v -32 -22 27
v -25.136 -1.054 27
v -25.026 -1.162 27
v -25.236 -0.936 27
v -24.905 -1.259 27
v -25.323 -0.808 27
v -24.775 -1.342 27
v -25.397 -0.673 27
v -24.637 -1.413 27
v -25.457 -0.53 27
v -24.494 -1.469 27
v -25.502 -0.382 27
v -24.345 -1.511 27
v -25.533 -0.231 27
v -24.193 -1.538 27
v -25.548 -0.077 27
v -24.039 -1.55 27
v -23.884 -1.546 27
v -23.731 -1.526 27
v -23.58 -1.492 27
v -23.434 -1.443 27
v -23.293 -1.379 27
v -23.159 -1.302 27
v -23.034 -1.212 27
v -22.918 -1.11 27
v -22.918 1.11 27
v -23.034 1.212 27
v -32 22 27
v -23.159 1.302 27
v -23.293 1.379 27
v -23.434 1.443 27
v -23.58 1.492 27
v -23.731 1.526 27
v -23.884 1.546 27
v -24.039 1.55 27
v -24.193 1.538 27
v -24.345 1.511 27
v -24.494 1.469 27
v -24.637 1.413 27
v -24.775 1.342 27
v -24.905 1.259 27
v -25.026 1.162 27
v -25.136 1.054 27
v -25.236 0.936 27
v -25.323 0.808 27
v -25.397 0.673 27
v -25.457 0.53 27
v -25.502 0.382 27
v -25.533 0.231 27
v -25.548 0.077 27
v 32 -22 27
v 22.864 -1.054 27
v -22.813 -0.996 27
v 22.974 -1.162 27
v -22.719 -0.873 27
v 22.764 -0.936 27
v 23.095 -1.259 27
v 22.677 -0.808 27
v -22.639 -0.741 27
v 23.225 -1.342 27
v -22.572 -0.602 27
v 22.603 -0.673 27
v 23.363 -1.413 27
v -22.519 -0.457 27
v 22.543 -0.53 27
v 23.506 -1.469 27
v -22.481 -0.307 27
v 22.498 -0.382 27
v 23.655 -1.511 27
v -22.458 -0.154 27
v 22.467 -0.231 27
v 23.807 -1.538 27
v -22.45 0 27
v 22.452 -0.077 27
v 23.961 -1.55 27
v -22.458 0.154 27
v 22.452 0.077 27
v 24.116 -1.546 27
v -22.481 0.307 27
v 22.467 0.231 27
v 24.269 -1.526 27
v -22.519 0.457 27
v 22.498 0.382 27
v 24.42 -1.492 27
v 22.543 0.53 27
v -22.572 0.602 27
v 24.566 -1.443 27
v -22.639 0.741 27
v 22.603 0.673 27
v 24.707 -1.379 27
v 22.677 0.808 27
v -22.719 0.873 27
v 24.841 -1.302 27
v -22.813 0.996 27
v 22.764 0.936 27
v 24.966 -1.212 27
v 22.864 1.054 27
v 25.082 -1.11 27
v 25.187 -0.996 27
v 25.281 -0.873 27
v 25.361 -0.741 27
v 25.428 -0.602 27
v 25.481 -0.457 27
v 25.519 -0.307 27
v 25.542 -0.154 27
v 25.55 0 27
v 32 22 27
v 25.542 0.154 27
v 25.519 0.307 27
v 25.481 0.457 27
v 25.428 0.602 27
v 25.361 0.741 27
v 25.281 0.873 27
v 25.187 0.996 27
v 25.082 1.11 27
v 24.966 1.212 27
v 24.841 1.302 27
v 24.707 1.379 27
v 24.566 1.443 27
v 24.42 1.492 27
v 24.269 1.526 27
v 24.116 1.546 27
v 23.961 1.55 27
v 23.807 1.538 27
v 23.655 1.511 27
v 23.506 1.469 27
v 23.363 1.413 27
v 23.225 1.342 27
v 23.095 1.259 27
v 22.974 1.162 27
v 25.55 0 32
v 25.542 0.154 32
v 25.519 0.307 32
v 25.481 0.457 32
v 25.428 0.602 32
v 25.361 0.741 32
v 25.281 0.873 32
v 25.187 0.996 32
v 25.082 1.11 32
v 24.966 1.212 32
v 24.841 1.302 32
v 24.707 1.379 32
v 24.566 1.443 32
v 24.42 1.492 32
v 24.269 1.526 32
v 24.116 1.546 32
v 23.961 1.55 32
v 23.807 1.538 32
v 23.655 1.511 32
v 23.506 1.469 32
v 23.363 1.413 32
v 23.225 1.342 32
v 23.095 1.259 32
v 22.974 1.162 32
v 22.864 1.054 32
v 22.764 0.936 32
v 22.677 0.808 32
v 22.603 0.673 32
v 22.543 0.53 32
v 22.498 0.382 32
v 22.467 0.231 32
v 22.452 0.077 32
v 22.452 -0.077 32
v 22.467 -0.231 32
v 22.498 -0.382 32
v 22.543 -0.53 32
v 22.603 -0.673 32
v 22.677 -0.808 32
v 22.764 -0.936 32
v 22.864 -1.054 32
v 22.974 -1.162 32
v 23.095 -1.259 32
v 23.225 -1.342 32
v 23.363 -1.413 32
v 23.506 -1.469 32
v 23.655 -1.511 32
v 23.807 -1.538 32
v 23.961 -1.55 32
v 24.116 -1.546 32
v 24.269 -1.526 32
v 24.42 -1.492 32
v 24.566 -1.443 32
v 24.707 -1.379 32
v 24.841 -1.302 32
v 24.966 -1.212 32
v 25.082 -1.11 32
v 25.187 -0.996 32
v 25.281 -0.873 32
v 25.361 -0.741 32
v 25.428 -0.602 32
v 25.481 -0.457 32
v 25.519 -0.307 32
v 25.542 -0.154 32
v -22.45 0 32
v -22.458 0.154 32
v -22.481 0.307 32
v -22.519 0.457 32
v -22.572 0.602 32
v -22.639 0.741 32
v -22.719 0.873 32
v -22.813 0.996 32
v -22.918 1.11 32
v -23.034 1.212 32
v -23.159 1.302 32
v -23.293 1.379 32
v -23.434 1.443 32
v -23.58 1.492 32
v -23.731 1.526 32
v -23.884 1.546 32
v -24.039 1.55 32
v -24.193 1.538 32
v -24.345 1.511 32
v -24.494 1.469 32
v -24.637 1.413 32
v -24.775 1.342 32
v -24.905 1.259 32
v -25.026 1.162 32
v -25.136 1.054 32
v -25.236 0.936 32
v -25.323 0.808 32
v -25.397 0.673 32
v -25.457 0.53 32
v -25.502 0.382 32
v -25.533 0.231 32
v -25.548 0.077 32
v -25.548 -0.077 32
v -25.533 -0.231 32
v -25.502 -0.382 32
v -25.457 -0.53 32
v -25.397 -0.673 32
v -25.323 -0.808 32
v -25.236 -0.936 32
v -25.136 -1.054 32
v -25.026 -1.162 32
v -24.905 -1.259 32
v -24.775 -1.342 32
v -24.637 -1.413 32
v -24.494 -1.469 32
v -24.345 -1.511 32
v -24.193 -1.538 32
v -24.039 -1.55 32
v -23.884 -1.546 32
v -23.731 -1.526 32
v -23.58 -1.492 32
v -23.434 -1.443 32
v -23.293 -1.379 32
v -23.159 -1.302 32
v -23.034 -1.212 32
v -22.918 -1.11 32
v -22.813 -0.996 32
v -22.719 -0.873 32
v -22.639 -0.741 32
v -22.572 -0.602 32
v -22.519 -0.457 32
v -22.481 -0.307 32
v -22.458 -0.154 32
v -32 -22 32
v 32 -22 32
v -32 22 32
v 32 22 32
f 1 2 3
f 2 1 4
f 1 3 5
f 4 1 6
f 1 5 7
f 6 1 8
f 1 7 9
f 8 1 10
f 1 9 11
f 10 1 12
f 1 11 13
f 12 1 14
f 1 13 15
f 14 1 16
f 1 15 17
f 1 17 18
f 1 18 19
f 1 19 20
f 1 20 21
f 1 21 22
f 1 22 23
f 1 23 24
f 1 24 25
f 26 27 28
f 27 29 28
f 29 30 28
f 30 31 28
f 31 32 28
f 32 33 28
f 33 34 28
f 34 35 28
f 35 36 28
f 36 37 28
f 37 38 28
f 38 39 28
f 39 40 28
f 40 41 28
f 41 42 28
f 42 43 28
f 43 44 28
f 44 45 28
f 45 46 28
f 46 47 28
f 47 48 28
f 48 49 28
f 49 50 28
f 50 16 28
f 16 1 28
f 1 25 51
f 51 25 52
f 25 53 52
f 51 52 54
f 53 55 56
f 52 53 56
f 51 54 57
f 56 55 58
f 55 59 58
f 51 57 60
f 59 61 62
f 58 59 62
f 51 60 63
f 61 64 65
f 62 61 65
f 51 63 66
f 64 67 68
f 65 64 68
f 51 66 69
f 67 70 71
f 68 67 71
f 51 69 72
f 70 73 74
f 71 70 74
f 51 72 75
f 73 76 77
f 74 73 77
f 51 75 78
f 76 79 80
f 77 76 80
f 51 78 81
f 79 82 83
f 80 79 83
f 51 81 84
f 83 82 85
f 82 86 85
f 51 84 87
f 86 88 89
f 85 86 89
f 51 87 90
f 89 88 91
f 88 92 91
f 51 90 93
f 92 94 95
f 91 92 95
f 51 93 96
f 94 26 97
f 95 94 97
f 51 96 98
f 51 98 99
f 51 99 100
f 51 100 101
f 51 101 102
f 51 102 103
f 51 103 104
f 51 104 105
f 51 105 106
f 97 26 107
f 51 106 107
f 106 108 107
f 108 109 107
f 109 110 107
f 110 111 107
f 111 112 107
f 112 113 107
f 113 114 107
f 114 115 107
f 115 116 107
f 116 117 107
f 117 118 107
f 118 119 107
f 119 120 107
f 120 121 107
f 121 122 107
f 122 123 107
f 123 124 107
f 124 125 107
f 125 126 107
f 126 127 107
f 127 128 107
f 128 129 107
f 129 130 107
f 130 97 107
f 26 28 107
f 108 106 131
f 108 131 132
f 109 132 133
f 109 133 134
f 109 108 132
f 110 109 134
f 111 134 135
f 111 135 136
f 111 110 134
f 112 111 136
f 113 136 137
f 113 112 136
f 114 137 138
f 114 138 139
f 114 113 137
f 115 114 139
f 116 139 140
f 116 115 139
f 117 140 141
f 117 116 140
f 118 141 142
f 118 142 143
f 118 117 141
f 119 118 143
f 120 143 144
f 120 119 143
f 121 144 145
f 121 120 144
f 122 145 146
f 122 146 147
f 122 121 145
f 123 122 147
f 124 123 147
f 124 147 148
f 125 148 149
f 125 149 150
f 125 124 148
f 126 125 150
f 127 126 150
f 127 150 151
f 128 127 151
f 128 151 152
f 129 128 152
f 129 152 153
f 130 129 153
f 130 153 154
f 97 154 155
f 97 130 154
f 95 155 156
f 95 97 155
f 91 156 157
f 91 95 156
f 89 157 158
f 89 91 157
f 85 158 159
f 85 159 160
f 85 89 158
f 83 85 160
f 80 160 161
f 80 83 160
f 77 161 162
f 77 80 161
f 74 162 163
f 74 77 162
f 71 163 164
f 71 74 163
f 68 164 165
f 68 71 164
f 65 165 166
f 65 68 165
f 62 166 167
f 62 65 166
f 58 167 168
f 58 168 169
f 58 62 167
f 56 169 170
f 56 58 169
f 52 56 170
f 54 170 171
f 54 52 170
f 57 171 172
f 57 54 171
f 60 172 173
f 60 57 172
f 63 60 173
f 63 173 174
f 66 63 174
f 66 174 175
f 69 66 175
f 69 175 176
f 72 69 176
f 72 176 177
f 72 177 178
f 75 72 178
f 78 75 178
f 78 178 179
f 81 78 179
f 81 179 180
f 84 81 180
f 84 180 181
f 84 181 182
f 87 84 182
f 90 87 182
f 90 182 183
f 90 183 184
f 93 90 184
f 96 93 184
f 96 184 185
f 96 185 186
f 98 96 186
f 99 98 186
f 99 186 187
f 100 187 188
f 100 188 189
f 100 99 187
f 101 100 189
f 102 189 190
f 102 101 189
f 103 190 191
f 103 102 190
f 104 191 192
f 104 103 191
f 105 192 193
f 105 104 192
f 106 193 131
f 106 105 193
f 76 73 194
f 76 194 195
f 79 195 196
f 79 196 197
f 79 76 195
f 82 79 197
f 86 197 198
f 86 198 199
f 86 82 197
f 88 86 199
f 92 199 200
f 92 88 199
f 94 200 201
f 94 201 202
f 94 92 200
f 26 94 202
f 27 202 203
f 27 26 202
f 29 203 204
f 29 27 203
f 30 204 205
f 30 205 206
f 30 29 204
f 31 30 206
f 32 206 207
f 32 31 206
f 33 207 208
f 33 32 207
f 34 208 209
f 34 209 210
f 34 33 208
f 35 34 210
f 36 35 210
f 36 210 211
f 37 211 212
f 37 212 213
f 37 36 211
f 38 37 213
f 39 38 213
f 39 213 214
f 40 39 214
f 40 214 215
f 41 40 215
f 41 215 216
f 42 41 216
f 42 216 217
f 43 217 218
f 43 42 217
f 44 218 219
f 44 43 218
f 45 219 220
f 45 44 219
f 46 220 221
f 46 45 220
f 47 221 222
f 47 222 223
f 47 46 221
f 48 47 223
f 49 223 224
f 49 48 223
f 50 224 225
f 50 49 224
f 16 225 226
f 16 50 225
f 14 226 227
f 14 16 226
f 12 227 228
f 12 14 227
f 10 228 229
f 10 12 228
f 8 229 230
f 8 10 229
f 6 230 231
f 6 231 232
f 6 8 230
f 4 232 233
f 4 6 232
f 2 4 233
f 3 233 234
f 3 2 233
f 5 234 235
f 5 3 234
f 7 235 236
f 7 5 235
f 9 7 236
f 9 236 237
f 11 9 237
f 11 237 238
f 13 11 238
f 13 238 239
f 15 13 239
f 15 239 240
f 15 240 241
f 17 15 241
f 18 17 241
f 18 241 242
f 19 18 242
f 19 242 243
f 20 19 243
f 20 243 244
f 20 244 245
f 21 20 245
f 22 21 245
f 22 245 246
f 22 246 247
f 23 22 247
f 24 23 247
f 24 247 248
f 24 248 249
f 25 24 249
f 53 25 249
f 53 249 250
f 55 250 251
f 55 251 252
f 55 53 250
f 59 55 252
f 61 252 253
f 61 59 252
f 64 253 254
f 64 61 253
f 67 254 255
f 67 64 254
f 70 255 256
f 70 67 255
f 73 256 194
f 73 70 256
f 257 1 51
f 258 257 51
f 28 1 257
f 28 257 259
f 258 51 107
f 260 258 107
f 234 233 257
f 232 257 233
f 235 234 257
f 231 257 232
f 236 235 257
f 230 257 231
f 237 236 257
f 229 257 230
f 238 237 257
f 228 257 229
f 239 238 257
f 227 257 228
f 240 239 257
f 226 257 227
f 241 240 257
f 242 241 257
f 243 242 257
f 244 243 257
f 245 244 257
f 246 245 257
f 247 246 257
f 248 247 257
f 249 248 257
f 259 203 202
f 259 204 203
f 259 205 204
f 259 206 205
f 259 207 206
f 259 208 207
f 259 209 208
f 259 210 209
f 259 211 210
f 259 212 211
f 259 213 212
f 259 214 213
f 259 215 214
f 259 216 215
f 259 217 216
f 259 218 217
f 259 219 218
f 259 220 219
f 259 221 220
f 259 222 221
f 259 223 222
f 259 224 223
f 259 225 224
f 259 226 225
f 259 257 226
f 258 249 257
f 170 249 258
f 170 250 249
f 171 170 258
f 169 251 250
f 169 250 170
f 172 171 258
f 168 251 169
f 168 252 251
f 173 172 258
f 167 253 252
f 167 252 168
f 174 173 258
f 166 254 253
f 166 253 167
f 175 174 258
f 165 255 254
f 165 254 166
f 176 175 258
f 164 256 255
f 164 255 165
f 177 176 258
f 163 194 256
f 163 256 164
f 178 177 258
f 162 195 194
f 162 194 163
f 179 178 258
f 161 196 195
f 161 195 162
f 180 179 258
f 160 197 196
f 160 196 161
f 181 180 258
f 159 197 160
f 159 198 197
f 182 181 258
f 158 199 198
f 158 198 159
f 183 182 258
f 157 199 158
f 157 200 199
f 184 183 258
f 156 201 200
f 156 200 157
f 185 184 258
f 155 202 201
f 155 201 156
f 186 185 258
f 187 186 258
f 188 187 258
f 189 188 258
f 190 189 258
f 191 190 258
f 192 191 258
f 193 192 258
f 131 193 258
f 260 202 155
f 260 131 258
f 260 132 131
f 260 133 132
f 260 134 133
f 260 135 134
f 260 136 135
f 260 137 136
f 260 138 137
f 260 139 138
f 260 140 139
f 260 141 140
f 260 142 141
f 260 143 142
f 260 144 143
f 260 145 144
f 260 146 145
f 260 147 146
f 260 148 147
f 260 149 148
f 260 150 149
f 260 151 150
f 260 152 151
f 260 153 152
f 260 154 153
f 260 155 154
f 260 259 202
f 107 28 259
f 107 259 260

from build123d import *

# Parameters (mm, degrees)
F_5MM_START          = 27
SKETCH_1_W           = 64
SKETCH_1_H           = 44
F_5MM_DEPTH          = 5
CUT_EXTRUDE_START    = 27
SKETCH_2_R           = 1.55
CUT_EXTRUDE_48_DEPTH = 5


with BuildPart() as part:
    # 草图1 → 模拟5mm车架_非整车底板模型 (new body)
    with BuildSketch(Plane.XY.offset(F_5MM_START)):
        Rectangle(SKETCH_1_W, SKETCH_1_H)
    extrude(amount=F_5MM_DEPTH)

    # 草图2 → 检具48孔距 (cut)
    with BuildSketch(Plane.XY.offset(CUT_EXTRUDE_START)):
        with Locations((-24, 0)):
            Circle(SKETCH_2_R)
        with Locations((24, 0)):
            Circle(SKETCH_2_R)
    extrude(amount=CUT_EXTRUDE_48_DEPTH, mode=Mode.SUBTRACT)


solid = part.part
